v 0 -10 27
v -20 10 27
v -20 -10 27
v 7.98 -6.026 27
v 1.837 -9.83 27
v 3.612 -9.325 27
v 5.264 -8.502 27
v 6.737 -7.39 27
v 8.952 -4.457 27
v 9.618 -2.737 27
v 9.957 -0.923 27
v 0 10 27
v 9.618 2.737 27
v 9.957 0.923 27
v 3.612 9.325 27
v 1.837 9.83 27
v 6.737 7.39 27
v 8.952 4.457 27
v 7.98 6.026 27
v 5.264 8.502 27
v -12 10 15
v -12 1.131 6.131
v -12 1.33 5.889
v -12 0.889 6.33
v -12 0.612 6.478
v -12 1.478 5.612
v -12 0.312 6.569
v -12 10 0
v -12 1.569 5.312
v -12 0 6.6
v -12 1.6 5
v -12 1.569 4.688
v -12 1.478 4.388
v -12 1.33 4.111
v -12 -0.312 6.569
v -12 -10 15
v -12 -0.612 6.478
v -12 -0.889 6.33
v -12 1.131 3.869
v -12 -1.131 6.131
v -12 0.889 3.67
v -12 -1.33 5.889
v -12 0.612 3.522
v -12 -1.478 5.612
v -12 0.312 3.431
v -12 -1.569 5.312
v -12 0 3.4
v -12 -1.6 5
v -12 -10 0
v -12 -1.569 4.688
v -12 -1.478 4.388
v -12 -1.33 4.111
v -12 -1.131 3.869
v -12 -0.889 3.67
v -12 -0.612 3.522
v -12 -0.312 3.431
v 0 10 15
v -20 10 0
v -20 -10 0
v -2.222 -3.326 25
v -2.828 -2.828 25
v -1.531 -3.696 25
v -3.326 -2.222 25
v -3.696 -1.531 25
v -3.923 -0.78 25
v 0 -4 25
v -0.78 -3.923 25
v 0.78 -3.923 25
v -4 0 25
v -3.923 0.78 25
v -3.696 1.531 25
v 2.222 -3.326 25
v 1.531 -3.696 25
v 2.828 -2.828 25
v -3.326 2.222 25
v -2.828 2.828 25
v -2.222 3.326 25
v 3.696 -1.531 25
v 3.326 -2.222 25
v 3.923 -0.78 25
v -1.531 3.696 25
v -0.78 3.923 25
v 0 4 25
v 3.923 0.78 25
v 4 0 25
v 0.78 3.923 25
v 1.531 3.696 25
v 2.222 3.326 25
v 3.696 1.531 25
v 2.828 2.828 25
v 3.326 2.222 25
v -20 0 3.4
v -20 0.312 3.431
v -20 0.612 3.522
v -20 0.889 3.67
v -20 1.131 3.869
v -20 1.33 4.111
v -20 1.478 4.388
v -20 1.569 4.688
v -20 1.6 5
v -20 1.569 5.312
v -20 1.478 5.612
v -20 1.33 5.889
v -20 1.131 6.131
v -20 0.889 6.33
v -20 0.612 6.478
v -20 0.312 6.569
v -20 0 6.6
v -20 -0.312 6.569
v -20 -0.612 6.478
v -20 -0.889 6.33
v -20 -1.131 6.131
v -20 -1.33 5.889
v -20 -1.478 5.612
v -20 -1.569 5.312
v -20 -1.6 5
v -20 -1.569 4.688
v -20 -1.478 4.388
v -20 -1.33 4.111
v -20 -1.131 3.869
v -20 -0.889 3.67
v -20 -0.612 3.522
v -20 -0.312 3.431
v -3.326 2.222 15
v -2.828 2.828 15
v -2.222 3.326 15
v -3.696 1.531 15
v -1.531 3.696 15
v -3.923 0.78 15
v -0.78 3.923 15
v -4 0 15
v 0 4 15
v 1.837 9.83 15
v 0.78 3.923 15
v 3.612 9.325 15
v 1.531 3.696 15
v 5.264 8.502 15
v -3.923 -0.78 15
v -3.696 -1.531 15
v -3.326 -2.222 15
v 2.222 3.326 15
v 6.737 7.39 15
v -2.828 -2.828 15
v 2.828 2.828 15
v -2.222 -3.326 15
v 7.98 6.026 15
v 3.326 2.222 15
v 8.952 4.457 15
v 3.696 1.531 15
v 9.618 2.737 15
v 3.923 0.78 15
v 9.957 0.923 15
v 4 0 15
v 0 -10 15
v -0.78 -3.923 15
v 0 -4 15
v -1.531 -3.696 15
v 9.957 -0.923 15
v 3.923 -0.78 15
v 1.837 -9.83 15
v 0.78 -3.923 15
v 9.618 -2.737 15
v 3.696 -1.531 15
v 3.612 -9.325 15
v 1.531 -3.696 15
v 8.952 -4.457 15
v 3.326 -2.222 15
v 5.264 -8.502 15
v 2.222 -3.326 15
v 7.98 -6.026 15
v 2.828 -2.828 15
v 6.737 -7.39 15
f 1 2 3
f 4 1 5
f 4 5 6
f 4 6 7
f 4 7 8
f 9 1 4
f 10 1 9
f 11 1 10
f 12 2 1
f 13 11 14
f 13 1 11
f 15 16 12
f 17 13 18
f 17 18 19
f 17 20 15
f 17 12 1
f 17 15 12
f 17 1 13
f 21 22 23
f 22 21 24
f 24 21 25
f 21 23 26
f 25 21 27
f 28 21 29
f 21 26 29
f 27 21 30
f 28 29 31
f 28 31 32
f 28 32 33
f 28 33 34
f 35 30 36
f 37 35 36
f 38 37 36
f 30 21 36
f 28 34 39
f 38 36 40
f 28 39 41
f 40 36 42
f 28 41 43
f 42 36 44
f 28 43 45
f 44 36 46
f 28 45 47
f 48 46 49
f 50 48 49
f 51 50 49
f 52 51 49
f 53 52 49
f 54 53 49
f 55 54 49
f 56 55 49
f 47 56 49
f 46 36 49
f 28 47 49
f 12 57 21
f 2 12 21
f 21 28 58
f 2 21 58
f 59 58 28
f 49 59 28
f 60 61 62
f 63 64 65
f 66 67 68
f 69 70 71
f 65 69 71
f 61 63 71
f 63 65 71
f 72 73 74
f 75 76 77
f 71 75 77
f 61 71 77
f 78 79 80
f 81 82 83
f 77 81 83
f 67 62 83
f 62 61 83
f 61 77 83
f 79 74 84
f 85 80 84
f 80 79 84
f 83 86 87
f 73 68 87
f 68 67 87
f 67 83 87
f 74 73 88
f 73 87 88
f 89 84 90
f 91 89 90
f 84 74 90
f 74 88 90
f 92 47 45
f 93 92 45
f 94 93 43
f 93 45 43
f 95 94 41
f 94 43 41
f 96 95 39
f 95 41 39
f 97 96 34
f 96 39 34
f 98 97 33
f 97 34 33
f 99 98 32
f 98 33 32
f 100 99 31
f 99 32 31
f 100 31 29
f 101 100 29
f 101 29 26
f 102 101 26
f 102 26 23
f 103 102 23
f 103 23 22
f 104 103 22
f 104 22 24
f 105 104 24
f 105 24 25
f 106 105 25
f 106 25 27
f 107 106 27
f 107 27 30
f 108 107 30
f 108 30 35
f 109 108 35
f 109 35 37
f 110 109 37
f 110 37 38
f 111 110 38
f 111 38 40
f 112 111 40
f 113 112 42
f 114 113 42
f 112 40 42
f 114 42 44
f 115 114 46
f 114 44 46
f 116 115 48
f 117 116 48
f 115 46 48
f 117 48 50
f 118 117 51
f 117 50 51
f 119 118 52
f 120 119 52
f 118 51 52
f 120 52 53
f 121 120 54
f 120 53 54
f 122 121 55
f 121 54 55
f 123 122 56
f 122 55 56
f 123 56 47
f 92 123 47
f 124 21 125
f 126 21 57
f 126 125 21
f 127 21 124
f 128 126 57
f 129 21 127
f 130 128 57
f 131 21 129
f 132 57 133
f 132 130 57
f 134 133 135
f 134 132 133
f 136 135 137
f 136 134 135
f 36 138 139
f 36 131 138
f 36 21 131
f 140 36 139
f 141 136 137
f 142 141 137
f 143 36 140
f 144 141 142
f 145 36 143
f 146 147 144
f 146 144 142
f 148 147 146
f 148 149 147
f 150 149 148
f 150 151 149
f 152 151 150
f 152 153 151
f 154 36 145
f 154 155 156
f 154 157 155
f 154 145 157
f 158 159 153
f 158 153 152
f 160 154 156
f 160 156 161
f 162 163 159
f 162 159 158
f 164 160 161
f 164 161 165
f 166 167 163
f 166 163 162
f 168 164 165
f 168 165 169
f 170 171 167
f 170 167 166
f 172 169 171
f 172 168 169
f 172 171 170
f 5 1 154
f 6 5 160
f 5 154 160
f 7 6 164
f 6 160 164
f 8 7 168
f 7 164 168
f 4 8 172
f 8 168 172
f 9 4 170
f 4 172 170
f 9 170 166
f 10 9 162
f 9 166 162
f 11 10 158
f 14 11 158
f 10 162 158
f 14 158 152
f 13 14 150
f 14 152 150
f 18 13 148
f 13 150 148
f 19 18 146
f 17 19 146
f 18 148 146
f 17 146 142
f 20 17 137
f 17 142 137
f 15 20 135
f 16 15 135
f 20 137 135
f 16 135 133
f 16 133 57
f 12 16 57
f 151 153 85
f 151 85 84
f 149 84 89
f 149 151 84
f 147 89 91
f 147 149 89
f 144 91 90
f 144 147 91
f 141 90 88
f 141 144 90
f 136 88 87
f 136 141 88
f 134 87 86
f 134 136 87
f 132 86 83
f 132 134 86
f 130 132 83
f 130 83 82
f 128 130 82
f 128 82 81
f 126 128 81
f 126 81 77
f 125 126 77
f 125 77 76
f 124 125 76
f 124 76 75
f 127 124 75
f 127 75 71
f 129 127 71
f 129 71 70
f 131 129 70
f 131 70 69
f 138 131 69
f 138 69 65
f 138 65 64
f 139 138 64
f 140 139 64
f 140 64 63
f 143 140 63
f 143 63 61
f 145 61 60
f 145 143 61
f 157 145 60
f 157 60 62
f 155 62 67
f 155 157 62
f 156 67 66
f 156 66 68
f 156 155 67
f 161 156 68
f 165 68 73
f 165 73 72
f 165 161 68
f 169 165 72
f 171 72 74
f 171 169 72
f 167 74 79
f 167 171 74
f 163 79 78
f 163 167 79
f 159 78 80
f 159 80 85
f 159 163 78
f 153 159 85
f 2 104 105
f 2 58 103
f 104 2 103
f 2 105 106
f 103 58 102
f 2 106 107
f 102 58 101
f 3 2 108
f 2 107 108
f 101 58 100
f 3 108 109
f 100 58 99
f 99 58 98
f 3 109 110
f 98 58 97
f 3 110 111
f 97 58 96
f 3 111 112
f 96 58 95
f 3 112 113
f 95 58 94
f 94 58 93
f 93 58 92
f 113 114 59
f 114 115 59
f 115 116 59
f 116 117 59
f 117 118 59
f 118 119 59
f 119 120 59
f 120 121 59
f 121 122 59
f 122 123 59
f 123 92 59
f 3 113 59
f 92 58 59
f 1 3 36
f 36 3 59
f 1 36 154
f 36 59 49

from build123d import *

# Parameters (mm, degrees)
ESBO_O1_R                  = 4
RESSALTO_EXTRUS_O1_DEPTH   = 25
CORTE_EXTRUS_O1_DEPTH      = 38.749172176
CORTE_EXTRUS_O1_DEPTH_BACK = 38.749172176
ESBO_O2_W                  = 22
ESBO_O2_H                  = 15
ESBO_O3_R                  = 1.6
CORTE_EXTRUS_O2_DEPTH      = 20
RESSALTO_EXTRUS_O3_DEPTH   = 2


with BuildPart() as part:
    # Esboço1 → Ressalto-extrusão1 (new body)
    with BuildSketch(Plane.XY):
        with BuildLine():
            Line((0, 10), (-20, 10))
            Line((-20, 10), (-20, -10))
            Line((-20, -10), (0, -10))
            ThreePointArc((0, -10), (10, 0), (0, 10))
        make_face()
        Circle(ESBO_O1_R, mode=Mode.SUBTRACT)
    extrude(amount=RESSALTO_EXTRUS_O1_DEPTH)

    # Esboço2 → Corte-extrusão1 (cut, two sides: drawn at the far end of the back side and taken through both)
    with BuildSketch(Plane(origin=(0, 10, 0), x_dir=(1, 0, 0), z_dir=(0, 1, 0)).offset(-CORTE_EXTRUS_O1_DEPTH_BACK)):
        with Locations((-1, -7.5)):
            Rectangle(ESBO_O2_W, ESBO_O2_H)
    extrude(amount=CORTE_EXTRUS_O1_DEPTH + CORTE_EXTRUS_O1_DEPTH_BACK, mode=Mode.SUBTRACT)

    # Esboço3 → Corte-extrusão2 (cut)
    with BuildSketch(Plane(origin=(-12, 0, 0), x_dir=(0, 0, -1), z_dir=(1, 0, 0))):
        with Locations((-5, 0)):
            Circle(ESBO_O3_R)
    extrude(amount=-CORTE_EXTRUS_O2_DEPTH, mode=Mode.SUBTRACT)

    # Esboço5 → Ressalto-extrusão3 (add)
    with BuildSketch(Plane.XY.offset(25)):
        with BuildLine():
            Line((0, 10), (-20, 10))
            Line((-20, 10), (-20, -10))
            Line((-20, -10), (0, -10))
            ThreePointArc((0, -10), (10, 0), (0, 10))
        make_face()
    extrude(amount=RESSALTO_EXTRUS_O3_DEPTH)


solid = part.part
